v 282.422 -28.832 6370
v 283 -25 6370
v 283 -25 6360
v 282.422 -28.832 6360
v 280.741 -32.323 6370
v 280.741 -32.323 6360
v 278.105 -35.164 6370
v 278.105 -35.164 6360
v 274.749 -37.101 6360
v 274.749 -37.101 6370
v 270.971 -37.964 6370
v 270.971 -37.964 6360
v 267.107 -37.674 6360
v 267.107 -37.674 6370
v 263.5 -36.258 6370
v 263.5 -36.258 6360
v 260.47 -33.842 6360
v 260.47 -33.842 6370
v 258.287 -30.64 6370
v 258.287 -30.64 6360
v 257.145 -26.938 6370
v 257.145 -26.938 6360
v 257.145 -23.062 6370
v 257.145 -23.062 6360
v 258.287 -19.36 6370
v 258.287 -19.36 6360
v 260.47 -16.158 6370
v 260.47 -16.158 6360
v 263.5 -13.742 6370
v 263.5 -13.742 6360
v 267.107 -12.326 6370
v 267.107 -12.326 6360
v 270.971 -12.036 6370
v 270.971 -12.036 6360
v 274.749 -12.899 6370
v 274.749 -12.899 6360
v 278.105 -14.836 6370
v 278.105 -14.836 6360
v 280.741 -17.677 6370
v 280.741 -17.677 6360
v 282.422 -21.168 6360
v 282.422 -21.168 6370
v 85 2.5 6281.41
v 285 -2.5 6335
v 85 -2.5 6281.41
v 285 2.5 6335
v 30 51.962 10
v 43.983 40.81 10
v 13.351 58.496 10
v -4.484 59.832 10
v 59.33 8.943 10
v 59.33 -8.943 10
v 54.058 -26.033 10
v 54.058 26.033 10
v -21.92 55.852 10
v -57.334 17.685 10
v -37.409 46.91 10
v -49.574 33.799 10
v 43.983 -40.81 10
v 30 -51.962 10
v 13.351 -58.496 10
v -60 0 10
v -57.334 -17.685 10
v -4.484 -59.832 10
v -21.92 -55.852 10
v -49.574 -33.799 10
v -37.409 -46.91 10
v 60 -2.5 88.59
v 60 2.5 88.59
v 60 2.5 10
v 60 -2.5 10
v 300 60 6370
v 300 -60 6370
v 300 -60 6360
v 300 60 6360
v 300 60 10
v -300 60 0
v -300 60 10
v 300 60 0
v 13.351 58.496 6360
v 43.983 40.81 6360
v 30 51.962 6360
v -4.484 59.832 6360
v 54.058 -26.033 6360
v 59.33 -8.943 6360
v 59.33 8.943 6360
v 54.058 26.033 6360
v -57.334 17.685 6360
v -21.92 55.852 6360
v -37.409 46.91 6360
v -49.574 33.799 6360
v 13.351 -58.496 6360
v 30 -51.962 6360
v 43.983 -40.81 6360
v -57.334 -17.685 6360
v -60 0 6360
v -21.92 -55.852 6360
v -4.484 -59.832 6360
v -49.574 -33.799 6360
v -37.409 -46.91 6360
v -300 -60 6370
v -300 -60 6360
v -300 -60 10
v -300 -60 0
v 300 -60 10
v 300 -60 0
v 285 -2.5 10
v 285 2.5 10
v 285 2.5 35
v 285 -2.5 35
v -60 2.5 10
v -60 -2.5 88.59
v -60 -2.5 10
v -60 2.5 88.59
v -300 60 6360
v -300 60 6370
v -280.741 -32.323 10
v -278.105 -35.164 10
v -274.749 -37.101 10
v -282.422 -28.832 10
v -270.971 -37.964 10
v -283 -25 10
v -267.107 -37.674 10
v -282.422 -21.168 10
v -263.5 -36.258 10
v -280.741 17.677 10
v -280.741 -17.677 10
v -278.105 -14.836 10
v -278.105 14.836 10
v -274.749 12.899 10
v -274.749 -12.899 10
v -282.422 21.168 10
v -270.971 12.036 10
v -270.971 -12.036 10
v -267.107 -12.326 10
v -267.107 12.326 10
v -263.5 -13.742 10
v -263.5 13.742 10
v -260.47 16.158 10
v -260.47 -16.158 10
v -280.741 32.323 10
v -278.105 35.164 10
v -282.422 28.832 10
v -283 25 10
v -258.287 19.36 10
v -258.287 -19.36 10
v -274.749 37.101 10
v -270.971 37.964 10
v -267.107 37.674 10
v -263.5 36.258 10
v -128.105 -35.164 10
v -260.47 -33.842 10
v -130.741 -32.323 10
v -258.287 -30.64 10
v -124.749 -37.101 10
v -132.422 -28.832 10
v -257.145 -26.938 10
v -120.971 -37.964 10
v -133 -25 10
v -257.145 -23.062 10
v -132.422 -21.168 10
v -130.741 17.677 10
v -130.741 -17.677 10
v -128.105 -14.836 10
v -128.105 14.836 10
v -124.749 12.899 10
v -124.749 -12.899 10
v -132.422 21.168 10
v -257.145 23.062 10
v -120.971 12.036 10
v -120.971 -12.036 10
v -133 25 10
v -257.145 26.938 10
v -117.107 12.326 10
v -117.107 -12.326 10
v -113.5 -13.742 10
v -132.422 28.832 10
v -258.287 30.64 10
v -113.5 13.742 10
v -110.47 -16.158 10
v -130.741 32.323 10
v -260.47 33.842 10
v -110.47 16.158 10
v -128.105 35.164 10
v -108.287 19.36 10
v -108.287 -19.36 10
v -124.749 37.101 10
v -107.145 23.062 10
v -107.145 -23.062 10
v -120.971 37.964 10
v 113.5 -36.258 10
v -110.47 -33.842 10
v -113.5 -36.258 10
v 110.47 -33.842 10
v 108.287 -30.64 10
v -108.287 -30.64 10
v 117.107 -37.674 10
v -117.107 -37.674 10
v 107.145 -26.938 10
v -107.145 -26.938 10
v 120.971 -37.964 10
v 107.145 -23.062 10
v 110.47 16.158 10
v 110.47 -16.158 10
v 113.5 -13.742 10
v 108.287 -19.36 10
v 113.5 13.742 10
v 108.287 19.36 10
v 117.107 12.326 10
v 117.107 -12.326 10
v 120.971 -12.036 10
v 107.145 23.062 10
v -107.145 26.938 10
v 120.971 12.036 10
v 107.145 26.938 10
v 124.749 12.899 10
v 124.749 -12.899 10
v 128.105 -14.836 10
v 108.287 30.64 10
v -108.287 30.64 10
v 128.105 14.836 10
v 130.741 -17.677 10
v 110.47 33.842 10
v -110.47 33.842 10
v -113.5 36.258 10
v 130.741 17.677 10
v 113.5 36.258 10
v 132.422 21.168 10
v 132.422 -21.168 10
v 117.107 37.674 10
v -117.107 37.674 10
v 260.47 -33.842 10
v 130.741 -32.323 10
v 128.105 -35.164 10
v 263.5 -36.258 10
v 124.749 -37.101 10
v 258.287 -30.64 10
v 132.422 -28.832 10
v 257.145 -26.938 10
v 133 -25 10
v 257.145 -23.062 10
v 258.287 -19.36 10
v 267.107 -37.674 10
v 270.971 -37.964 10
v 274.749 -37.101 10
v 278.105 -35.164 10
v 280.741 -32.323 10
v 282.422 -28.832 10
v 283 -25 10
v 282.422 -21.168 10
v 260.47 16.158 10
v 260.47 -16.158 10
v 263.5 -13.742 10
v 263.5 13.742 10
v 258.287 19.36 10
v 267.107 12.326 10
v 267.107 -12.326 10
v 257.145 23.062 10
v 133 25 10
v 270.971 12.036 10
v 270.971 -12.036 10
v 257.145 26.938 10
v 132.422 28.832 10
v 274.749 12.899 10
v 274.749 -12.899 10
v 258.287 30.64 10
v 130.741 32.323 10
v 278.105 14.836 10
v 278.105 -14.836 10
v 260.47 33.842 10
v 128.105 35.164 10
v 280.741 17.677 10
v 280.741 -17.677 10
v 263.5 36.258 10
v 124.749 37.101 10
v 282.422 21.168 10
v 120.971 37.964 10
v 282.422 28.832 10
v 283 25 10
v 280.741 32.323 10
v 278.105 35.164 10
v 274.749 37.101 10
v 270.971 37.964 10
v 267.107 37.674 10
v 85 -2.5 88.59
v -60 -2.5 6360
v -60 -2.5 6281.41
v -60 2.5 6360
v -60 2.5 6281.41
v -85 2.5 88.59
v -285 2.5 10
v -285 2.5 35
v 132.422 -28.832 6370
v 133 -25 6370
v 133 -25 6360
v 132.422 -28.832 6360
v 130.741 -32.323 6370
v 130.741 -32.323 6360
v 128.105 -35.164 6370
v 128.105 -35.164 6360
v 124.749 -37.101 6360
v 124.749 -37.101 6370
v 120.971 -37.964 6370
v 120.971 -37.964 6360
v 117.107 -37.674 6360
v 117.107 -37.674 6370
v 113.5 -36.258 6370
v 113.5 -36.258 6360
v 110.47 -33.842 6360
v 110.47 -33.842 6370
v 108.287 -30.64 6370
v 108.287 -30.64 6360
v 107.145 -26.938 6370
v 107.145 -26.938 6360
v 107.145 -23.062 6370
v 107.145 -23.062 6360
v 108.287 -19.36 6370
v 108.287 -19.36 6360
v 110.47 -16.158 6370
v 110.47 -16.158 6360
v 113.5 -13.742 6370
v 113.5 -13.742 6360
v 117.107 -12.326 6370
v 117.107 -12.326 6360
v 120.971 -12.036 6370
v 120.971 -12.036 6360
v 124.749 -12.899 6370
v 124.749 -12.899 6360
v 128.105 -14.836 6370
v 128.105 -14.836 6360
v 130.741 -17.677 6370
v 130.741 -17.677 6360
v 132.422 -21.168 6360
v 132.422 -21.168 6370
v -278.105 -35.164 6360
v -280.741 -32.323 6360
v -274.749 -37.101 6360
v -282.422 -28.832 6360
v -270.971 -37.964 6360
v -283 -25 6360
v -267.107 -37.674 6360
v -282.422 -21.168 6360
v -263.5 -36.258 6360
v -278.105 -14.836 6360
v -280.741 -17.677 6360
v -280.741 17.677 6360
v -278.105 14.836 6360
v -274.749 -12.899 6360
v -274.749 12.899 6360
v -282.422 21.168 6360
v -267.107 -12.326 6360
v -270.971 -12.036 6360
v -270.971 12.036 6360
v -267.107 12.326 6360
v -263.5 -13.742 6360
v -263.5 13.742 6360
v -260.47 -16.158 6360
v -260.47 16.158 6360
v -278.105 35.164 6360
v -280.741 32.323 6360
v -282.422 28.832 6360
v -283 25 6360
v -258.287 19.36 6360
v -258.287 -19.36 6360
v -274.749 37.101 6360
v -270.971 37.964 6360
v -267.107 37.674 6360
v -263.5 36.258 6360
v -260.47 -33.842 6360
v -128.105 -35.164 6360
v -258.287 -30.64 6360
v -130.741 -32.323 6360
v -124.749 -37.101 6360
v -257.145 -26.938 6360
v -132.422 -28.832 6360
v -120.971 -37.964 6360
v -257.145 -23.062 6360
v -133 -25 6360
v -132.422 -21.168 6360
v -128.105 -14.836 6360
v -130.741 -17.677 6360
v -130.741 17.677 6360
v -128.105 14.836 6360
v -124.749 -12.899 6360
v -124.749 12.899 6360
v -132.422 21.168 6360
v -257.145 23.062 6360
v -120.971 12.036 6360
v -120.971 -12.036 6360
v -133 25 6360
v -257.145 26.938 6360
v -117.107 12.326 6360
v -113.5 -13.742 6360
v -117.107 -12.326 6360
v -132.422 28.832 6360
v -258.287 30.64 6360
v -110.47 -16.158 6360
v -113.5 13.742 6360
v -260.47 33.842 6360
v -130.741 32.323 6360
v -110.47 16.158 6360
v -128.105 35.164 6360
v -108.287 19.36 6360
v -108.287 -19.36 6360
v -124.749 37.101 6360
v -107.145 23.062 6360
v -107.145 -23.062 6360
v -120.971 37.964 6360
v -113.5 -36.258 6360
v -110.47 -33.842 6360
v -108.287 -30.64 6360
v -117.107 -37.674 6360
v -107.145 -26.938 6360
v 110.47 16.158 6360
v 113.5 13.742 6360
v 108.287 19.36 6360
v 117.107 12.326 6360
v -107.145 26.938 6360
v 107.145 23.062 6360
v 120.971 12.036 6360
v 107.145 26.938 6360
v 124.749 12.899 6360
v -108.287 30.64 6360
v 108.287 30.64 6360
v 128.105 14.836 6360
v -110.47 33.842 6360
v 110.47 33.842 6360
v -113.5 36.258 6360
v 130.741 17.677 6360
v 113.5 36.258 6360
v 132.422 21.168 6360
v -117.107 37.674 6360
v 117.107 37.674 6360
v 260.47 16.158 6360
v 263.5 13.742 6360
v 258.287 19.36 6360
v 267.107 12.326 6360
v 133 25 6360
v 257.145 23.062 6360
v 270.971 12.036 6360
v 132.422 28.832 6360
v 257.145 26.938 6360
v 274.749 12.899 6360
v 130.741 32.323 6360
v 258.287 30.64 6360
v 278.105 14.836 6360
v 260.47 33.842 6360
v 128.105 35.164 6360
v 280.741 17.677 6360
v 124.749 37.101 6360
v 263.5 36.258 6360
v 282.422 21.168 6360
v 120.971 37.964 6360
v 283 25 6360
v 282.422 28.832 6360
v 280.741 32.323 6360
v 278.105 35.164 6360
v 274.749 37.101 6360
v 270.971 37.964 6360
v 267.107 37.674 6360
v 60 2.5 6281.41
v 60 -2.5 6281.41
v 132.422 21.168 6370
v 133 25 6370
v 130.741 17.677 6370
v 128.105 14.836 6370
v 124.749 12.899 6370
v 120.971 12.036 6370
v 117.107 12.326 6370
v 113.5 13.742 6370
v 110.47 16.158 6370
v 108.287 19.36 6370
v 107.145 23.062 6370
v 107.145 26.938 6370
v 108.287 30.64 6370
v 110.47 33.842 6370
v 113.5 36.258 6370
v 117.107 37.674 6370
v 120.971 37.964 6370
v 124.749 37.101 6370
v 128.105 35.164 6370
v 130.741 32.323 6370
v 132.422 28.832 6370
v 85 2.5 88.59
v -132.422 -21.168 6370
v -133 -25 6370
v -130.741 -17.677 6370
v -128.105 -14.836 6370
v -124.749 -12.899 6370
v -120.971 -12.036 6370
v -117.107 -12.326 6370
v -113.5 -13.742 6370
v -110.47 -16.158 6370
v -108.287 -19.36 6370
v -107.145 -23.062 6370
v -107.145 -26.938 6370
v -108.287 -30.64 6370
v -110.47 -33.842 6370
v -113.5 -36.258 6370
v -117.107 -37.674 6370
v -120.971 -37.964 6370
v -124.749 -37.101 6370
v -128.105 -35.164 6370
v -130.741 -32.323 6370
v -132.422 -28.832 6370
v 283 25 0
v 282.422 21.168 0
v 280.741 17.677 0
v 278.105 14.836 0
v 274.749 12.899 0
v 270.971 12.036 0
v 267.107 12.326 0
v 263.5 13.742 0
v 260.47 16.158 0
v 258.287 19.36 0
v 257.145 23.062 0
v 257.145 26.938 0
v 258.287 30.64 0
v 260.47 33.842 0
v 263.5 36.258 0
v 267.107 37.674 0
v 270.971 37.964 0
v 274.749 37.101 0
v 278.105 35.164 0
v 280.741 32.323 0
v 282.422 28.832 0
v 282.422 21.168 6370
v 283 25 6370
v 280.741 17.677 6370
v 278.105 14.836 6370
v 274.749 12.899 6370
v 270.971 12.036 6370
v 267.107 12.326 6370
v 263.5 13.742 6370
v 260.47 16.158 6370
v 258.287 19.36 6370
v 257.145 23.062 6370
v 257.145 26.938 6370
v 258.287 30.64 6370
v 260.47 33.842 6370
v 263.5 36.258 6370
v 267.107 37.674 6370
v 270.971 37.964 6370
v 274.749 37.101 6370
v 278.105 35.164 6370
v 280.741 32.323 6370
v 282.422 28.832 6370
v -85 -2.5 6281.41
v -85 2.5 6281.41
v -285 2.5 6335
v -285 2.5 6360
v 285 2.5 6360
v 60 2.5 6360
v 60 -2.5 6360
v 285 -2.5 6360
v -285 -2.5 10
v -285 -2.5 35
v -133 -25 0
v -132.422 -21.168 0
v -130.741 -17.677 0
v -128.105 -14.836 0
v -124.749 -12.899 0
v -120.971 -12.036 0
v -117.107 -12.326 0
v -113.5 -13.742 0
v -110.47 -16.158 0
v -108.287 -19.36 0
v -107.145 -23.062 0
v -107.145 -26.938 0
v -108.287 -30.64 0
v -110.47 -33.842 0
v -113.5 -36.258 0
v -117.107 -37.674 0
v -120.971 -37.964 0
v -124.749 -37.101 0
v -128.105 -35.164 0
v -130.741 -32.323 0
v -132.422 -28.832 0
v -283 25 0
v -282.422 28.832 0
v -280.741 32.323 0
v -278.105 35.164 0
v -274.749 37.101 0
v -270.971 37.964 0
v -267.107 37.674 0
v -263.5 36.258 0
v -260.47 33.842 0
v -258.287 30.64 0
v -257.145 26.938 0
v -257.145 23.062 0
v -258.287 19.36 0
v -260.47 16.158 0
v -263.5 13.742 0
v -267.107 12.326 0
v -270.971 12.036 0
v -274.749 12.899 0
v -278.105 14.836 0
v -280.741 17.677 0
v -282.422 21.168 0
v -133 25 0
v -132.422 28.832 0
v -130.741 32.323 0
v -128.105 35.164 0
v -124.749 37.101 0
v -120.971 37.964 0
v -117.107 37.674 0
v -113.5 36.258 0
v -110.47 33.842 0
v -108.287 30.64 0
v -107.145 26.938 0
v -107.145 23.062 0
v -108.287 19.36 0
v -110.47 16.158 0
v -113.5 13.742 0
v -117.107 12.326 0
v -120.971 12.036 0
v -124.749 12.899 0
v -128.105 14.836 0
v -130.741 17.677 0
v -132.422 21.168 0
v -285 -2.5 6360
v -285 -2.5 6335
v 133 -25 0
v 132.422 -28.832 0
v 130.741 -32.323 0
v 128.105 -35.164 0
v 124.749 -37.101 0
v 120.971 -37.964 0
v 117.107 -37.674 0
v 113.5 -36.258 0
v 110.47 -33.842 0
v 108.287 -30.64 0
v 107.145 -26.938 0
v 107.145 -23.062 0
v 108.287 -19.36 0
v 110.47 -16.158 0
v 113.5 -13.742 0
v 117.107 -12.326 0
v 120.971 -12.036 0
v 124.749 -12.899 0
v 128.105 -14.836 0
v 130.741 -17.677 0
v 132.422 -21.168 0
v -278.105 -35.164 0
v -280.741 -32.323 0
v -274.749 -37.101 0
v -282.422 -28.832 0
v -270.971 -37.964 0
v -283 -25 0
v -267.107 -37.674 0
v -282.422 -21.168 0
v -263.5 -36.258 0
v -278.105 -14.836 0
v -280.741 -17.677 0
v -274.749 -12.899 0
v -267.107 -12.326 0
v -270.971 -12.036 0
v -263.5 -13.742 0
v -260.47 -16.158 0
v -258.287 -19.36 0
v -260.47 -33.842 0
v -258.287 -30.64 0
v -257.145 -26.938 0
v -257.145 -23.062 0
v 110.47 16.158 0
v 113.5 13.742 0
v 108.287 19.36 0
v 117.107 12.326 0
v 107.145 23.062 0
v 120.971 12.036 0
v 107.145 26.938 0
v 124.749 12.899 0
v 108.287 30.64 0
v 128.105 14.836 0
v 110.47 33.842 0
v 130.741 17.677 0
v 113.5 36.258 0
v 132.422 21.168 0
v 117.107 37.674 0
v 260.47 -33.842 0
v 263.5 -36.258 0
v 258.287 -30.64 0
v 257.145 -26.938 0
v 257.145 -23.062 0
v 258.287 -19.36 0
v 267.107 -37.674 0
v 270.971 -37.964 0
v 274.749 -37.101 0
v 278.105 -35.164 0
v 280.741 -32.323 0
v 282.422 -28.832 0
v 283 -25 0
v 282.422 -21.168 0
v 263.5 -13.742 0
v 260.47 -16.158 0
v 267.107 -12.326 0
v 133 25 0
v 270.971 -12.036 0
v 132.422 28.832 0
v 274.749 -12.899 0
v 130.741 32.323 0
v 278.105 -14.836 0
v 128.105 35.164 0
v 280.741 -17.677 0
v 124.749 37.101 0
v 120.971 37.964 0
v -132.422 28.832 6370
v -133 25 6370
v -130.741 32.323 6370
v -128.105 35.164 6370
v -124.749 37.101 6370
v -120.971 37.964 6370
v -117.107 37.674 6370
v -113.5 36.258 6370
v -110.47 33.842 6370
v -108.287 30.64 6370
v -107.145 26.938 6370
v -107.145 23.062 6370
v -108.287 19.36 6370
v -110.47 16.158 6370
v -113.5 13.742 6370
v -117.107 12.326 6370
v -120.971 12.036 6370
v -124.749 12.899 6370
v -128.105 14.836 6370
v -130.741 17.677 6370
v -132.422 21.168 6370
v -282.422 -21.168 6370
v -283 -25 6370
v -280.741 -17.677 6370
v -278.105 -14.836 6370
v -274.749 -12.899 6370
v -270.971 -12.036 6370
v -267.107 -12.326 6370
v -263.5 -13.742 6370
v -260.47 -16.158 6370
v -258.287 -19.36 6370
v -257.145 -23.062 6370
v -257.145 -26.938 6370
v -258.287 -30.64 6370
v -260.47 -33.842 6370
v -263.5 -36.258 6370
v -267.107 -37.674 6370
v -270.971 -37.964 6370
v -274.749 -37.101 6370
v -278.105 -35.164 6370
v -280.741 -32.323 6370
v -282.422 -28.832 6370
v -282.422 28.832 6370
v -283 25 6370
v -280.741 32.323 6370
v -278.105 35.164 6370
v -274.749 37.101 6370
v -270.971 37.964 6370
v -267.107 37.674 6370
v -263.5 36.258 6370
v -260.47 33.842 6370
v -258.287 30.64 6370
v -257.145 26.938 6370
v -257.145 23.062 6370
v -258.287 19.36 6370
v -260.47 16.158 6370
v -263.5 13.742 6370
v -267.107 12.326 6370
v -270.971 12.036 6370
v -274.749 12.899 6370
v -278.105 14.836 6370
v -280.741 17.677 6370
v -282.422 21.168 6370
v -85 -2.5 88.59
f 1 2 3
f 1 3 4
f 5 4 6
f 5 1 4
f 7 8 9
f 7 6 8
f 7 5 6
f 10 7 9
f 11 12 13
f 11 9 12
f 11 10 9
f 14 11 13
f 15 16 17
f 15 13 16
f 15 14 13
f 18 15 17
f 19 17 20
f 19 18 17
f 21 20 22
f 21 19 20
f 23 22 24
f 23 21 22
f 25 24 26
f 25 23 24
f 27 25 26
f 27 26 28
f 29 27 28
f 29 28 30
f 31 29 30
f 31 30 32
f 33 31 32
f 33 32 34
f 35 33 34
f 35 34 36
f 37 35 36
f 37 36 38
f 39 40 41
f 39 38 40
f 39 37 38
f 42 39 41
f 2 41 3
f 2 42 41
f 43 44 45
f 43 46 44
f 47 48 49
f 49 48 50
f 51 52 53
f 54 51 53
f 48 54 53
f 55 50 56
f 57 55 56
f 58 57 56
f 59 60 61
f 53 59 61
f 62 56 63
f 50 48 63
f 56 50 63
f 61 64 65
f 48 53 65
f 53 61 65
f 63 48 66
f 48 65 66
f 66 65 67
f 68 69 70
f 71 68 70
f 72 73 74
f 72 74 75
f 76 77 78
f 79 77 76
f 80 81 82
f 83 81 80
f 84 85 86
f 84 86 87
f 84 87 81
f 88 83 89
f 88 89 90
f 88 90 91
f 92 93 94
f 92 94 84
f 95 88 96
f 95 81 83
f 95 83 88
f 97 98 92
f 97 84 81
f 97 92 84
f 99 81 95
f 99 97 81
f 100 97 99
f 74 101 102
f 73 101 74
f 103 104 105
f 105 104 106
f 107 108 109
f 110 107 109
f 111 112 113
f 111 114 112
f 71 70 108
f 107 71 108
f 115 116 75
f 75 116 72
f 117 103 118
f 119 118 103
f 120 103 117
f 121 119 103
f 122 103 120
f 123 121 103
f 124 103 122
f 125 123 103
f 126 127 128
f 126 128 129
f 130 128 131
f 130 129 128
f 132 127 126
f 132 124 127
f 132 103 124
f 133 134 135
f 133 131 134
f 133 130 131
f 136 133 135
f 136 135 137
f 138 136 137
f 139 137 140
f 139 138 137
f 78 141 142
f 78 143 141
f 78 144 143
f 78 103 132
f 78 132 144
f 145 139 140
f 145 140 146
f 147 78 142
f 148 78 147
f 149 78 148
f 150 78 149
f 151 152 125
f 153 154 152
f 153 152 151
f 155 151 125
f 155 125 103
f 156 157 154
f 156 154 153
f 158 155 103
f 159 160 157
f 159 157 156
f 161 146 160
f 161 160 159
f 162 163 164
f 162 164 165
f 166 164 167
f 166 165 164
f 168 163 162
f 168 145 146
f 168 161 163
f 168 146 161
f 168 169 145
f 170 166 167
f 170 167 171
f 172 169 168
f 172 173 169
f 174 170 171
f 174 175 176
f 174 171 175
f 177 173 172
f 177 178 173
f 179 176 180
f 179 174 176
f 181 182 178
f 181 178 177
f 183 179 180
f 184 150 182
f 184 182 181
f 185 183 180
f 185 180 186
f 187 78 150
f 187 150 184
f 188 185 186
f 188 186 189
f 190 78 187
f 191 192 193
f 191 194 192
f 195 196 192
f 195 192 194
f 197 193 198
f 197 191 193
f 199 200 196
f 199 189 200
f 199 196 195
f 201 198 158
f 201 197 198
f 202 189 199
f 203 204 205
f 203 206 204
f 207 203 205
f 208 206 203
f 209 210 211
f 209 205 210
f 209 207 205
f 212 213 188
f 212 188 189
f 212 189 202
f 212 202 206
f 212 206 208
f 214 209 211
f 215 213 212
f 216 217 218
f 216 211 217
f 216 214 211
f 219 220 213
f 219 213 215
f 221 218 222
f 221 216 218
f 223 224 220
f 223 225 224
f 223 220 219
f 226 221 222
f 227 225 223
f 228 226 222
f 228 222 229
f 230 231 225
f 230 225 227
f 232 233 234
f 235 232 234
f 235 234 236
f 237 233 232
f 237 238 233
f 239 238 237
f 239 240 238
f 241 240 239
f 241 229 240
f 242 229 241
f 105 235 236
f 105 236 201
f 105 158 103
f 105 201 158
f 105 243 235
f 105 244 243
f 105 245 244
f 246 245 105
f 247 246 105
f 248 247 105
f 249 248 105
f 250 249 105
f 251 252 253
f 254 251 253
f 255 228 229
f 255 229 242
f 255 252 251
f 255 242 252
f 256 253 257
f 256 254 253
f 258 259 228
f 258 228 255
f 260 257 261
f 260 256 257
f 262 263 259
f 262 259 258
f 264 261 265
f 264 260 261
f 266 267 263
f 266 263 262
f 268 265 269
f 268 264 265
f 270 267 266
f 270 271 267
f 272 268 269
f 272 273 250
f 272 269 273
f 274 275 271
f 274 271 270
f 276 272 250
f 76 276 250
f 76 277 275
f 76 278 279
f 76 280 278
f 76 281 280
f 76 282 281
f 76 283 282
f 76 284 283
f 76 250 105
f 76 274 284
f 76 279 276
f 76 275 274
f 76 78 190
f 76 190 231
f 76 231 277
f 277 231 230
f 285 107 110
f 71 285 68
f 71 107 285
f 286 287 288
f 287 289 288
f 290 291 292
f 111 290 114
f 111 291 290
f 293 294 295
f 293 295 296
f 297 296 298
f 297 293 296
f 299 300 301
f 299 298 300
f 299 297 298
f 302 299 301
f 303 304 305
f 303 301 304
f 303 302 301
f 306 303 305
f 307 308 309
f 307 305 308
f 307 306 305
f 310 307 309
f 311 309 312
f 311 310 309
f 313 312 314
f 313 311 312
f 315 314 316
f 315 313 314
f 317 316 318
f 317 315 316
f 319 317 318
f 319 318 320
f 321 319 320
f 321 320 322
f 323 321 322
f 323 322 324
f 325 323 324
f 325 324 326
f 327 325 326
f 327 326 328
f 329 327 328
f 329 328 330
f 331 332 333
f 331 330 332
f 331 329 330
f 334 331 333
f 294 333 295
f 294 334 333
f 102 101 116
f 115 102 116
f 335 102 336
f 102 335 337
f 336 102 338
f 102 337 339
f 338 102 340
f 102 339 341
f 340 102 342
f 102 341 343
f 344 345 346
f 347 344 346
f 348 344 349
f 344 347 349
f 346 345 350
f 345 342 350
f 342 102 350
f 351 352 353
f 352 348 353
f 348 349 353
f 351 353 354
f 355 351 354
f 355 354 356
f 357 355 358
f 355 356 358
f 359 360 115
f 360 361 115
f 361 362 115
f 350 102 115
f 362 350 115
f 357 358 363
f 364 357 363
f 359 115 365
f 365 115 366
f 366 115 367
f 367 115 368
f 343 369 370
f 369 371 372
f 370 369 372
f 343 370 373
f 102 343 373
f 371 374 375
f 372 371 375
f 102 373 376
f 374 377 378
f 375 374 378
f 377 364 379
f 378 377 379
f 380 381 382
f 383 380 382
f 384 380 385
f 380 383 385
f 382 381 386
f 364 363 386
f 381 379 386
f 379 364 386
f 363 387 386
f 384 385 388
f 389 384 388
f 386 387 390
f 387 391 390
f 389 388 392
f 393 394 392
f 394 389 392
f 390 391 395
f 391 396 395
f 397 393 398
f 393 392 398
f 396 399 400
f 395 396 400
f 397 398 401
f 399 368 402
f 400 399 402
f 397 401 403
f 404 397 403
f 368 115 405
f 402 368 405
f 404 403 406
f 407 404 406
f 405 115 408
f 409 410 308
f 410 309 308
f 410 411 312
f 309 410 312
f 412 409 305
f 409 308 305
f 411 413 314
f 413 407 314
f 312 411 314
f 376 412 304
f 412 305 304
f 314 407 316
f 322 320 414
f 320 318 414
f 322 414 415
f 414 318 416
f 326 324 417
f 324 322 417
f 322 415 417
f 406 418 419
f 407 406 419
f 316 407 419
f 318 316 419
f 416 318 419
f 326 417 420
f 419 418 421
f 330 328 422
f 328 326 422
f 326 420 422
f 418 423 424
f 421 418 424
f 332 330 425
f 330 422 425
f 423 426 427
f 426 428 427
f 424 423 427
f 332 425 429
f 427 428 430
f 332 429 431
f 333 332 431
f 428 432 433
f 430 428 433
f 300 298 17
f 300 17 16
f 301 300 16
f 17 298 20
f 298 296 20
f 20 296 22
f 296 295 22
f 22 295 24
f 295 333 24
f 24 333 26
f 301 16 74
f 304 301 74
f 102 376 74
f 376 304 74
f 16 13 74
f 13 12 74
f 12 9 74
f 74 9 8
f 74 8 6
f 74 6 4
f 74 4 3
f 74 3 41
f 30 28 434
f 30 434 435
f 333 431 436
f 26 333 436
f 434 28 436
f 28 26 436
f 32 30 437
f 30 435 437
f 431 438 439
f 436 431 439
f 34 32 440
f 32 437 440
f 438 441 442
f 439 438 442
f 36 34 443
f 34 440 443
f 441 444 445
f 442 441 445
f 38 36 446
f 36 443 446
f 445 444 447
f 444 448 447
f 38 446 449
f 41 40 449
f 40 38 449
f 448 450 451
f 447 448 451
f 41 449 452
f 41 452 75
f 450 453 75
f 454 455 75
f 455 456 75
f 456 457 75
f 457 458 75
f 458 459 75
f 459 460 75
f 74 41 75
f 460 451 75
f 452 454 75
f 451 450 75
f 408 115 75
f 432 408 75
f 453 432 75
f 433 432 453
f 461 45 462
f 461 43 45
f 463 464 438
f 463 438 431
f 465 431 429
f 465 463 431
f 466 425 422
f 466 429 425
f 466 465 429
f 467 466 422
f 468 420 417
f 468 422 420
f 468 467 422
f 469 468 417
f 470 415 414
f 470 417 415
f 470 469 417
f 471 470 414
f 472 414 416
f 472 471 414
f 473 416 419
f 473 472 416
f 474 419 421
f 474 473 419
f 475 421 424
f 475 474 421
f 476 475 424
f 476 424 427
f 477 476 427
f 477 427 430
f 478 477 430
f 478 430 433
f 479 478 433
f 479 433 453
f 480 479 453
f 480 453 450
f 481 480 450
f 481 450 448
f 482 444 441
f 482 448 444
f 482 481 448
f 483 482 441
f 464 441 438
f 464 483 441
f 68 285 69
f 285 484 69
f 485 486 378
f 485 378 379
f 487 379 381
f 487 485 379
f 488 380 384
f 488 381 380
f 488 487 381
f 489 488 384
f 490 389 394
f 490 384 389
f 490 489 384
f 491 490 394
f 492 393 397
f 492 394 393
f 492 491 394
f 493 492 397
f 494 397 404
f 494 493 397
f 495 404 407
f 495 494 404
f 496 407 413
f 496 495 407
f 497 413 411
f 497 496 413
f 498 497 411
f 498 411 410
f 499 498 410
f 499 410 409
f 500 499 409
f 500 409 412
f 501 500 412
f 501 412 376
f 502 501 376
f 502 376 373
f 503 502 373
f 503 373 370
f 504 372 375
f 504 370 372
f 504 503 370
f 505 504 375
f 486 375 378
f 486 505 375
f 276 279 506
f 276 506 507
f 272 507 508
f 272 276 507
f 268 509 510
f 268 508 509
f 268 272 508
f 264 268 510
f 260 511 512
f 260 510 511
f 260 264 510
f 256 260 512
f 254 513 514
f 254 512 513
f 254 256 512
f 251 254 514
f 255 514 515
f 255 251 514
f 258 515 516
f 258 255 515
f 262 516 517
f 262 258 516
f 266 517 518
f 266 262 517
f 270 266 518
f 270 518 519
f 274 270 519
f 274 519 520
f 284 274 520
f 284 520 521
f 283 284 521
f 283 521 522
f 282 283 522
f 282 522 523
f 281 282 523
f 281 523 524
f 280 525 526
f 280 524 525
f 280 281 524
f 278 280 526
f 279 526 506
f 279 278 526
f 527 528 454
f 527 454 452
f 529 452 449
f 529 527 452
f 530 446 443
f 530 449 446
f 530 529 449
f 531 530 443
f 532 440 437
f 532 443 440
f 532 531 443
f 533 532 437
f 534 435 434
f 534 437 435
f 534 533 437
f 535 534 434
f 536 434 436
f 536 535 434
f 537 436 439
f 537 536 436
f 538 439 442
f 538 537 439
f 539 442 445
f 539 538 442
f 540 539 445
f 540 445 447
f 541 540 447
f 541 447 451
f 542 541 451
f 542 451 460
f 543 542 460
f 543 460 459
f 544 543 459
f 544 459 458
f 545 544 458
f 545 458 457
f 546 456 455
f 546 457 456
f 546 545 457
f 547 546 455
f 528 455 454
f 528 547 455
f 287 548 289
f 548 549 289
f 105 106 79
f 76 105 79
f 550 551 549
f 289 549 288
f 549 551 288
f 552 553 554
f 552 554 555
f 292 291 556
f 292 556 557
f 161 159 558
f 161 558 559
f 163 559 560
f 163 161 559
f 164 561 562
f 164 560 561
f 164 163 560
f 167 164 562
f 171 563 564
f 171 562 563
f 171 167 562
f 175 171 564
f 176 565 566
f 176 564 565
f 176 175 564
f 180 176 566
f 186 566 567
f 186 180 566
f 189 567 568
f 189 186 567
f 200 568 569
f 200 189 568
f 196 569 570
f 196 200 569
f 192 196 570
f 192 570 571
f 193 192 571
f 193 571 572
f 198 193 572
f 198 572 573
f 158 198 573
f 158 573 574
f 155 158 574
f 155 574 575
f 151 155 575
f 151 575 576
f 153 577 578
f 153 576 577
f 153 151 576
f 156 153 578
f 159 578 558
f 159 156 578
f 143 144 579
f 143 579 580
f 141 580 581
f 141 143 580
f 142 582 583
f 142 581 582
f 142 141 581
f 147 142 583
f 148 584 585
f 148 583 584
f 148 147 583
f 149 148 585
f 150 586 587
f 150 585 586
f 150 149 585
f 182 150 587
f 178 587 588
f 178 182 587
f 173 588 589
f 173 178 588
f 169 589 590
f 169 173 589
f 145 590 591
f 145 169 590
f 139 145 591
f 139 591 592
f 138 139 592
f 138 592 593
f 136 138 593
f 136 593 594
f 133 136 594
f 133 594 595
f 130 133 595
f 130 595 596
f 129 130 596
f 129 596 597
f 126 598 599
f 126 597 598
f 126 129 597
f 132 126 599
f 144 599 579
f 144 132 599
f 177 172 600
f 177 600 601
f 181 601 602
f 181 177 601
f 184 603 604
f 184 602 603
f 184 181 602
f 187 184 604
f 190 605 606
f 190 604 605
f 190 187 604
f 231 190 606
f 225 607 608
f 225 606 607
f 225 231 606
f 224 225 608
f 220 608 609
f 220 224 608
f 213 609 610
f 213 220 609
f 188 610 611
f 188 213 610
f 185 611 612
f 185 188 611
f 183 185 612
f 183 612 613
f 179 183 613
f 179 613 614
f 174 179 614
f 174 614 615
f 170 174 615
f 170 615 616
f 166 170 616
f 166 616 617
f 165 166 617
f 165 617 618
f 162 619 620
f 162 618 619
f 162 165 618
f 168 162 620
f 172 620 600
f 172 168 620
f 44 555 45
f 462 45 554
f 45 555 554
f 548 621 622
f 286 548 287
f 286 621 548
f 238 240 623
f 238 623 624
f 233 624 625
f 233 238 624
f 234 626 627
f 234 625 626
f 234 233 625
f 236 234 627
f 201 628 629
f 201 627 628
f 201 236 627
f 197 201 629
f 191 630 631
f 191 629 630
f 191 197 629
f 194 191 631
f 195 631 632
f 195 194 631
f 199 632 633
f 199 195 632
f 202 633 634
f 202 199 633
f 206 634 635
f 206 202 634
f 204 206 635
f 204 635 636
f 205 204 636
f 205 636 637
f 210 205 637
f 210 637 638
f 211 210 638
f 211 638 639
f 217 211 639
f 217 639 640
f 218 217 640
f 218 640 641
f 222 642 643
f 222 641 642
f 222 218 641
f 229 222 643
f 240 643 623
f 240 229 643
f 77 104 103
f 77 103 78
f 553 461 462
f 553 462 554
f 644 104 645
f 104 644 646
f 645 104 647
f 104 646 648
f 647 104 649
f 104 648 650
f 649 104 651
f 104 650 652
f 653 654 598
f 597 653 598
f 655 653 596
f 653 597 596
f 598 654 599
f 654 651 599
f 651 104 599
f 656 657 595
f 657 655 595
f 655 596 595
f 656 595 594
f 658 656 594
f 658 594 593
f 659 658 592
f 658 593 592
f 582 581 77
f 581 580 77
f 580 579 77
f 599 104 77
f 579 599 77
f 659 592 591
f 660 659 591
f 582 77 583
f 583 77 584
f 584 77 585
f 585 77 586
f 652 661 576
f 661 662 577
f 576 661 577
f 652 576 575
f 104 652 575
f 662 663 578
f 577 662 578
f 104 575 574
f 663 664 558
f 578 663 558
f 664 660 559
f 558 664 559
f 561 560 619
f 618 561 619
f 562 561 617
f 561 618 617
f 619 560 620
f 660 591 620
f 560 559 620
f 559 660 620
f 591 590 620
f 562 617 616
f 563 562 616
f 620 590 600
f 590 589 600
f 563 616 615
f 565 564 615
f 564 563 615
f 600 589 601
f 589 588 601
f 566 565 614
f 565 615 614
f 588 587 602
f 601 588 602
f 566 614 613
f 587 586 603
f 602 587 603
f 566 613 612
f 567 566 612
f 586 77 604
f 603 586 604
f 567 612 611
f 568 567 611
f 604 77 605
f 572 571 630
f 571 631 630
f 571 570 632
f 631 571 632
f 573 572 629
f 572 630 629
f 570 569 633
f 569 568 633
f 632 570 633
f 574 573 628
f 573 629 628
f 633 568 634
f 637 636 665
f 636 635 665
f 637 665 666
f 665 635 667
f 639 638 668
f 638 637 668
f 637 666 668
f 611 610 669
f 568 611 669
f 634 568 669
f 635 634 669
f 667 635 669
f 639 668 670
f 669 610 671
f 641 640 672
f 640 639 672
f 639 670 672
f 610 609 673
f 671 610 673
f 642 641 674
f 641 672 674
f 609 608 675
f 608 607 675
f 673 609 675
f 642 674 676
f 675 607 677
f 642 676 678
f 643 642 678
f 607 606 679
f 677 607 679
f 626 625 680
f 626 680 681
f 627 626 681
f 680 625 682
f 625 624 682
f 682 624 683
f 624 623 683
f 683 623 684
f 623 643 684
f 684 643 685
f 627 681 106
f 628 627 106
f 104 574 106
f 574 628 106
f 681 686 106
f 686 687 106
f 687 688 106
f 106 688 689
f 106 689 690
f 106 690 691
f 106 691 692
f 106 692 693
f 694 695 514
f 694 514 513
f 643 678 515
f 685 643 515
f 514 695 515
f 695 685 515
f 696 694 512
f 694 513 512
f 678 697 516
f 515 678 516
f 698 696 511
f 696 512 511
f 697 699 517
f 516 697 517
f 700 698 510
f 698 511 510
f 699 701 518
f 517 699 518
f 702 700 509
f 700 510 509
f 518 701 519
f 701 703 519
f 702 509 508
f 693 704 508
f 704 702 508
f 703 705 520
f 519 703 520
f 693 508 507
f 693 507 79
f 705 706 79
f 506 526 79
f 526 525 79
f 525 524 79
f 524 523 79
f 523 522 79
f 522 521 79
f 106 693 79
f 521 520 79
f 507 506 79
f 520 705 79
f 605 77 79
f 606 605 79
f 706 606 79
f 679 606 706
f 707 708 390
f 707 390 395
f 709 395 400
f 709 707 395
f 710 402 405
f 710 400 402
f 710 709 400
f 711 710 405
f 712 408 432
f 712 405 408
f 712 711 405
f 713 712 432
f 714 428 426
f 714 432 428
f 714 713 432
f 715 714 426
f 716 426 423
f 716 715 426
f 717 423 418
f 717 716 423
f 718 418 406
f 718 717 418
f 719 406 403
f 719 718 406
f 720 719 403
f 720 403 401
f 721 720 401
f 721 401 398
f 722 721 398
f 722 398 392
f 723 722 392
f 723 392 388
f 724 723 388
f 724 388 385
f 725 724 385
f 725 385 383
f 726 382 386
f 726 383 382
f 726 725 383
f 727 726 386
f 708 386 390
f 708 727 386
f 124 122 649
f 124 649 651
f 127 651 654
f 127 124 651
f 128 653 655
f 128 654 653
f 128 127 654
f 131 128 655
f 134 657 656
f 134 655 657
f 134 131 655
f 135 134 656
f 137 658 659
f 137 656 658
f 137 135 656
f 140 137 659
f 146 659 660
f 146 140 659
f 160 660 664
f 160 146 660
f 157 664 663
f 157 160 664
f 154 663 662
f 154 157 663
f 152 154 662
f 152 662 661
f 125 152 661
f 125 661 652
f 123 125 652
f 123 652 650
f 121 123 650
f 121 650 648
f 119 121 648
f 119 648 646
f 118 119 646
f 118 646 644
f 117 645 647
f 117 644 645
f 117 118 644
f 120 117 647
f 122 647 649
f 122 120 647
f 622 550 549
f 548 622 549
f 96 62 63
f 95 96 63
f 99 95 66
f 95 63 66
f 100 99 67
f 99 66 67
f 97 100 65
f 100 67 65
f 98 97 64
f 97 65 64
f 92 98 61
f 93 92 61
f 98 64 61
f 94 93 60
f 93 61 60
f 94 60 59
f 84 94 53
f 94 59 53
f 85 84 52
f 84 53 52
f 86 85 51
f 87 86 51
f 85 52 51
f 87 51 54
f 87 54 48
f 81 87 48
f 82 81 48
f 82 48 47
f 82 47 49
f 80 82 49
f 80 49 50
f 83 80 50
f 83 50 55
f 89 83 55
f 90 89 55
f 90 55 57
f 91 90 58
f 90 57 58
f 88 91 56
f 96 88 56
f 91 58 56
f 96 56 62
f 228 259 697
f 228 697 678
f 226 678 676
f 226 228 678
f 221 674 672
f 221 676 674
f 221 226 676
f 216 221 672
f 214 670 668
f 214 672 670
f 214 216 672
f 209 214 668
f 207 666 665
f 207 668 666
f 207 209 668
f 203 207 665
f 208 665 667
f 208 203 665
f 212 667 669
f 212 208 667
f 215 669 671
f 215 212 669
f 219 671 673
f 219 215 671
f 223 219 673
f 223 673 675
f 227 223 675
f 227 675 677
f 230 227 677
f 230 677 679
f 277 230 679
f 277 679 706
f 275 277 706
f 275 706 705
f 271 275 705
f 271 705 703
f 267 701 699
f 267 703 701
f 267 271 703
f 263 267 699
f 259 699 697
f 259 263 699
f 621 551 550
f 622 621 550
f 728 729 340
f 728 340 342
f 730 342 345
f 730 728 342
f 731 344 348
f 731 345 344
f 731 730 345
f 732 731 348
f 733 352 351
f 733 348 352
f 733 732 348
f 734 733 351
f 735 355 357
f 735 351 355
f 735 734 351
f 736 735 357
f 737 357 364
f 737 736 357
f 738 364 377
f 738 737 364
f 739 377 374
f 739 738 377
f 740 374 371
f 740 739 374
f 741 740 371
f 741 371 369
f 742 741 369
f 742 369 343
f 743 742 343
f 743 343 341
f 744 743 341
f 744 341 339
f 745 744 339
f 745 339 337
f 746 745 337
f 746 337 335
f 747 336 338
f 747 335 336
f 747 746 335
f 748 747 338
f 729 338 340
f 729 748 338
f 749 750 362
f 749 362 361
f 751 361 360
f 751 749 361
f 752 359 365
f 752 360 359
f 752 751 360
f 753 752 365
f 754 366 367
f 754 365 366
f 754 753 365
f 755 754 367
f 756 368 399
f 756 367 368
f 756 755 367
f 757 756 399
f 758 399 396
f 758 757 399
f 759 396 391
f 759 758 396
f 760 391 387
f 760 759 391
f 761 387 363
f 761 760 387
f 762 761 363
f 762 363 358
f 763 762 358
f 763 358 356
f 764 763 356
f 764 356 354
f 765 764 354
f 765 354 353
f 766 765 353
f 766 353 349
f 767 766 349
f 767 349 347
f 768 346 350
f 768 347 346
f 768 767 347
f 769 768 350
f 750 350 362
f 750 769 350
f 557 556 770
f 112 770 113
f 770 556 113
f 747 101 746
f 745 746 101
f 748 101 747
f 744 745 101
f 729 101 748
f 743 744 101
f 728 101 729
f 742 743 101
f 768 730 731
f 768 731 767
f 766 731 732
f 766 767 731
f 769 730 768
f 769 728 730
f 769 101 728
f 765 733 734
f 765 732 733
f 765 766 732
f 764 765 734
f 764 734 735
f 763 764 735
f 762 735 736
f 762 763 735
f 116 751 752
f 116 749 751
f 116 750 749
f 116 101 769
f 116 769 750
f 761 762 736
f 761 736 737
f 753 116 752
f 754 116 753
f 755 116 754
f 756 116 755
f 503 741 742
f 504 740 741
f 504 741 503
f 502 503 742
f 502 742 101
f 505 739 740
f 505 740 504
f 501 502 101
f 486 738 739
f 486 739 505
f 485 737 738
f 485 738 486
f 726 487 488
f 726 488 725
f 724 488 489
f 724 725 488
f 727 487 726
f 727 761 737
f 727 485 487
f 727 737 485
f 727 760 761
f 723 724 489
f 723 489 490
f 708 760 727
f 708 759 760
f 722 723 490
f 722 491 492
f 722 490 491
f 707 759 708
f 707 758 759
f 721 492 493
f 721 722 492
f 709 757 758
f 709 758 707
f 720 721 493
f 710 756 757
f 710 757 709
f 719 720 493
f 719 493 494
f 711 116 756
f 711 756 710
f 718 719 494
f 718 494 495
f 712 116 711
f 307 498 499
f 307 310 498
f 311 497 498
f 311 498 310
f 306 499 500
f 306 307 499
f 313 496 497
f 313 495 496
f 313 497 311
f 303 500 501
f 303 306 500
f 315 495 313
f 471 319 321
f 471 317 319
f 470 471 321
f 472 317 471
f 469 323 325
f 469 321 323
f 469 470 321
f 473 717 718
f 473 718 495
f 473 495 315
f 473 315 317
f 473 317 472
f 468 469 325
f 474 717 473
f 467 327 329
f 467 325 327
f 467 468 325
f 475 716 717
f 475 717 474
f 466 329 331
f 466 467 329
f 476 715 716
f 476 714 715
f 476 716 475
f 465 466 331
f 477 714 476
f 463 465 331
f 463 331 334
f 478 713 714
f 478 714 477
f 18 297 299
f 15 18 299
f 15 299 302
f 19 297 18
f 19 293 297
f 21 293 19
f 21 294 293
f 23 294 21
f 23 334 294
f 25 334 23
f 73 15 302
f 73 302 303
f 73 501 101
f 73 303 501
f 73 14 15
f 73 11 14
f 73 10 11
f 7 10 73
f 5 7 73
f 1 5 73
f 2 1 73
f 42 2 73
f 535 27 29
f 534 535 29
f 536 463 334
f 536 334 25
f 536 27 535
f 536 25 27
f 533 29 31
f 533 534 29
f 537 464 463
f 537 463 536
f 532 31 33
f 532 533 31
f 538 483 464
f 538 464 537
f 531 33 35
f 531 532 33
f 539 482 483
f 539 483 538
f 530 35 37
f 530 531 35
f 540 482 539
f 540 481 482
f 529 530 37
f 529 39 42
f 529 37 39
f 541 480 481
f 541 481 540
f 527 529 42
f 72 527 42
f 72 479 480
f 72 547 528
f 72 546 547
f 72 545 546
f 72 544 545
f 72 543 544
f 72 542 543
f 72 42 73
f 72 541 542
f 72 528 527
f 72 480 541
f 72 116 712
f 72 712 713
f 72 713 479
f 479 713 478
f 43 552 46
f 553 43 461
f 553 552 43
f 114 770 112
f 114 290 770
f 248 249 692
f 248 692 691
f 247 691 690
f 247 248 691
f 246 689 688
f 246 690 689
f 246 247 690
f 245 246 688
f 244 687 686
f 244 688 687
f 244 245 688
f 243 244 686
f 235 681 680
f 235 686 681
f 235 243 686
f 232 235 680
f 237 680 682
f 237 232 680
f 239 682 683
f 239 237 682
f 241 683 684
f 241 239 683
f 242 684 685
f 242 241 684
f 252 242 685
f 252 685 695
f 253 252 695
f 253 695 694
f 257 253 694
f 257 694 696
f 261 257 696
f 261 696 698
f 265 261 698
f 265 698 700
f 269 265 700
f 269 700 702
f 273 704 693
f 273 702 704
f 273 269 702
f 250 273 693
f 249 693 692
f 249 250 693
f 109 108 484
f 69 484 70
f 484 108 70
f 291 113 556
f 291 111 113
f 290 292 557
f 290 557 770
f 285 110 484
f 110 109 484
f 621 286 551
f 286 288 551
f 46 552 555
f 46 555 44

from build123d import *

# Parameters (mm, degrees)
SKETCH1_W               = 600
SKETCH1_H               = 120
BOSS_EXTRUDE1_DEPTH     = 10
SKETCH2_R               = 60
BOSS_EXTRUDE2_DEPTH     = 6350
BOSS_EXTRUDE3_DEPTH     = 2.5
BOSS_EXTRUDE3_2_DEPTH   = 2.5
CUT_EXTRUDE1_DEPTH      = 3200.660138202
CUT_EXTRUDE1_DEPTH_BACK = 3200.660138202
SKETCH6_R               = 13


with BuildPart() as part:
    # Sketch1 → Boss-Extrude1 (new body)
    with BuildSketch(Plane.XY):
        Rectangle(SKETCH1_W, SKETCH1_H)
    extrude(amount=BOSS_EXTRUDE1_DEPTH)


with BuildPart() as body_2:
    # Sketch2 → Boss-Extrude2 (new body)
    with BuildSketch(Plane.XY.offset(10)):
        with Locations(Location((0, 0, 0), (0, 0, 180))):
            Circle(SKETCH2_R)
    extrude(amount=BOSS_EXTRUDE2_DEPTH)


with BuildPart() as body_3:
    # Sketch4 → Boss-Extrude3 (new, symmetric)
    with BuildSketch(Plane(origin=(0, 0, 0), x_dir=(1, 0, 0), z_dir=(0, 1, 0))):
        Polygon((285, -10), (285, -35), (85, -88.589838486), (60, -88.589838486), (60, -10), align=None)
    extrude(amount=BOSS_EXTRUDE3_DEPTH, both=True)


with BuildPart() as body_4:
    # Sketch4 → Boss-Extrude3 2 (new, symmetric)
    with BuildSketch(Plane(origin=(0, 0, 0), x_dir=(1, 0, 0), z_dir=(0, 1, 0))):
        Polygon((-60, -10), (-285, -10), (-285, -35), (-85, -88.589838486), (-60, -88.589838486), align=None)
    extrude(amount=BOSS_EXTRUDE3_2_DEPTH, both=True)


with BuildPart() as body_5:
    # Mirror1: mirrored copy
    add(part.part.mirror(Plane(origin=(0, 0, 3185), x_dir=(1, 0, 0), z_dir=(0, 0, -1))))


with BuildPart() as body_6:
    # Mirror1 2: mirrored copy
    add(body_4.part.mirror(Plane(origin=(0, 0, 3185), x_dir=(1, 0, 0), z_dir=(0, 0, -1))))


with BuildPart() as body_7:
    # Mirror1 3: mirrored copy
    add(body_3.part.mirror(Plane(origin=(0, 0, 3185), x_dir=(1, 0, 0), z_dir=(0, 0, -1))))


with BuildPart() as cut_extrude1_tool:
    # Sketch6 → Cut-Extrude1 (new, two sides: drawn at the far end of the back side and taken through both)
    with BuildSketch(Plane(origin=(0, 0, 3185), x_dir=(-1, 0, 0), z_dir=(0, 0, -1)).offset(-CUT_EXTRUDE1_DEPTH_BACK)):
        with Locations((270, 25)):
            Circle(SKETCH6_R)
        with Locations((270, -25)):
            Circle(SKETCH6_R)
        with Locations((120, 25)):
            Circle(SKETCH6_R)
        with Locations((120, -25)):
            Circle(SKETCH6_R)
        with Locations(Location((-120, -25, 0), (0, 0, 180))):
            Circle(SKETCH6_R)
        with Locations(Location((-120, 25, 0), (0, 0, 180))):
            Circle(SKETCH6_R)
        with Locations(Location((-270, -25, 0), (0, 0, 180))):
            Circle(SKETCH6_R)
        with Locations(Location((-270, 25, 0), (0, 0, 180))):
            Circle(SKETCH6_R)
    extrude(amount=CUT_EXTRUDE1_DEPTH + CUT_EXTRUDE1_DEPTH_BACK)


with BuildPart() as part_1:
    add(part.part)

    # Cut-Extrude1: cut by cut_extrude1_tool
    add(cut_extrude1_tool.part, mode=Mode.SUBTRACT)


with BuildPart() as body_5_1:
    add(body_5.part)

    # Cut-Extrude1: cut by cut_extrude1_tool
    add(cut_extrude1_tool.part, mode=Mode.SUBTRACT)


solid = Compound([body_2.part, body_3.part, body_4.part, body_6.part, body_7.part, part_1.part, body_5_1.part])
